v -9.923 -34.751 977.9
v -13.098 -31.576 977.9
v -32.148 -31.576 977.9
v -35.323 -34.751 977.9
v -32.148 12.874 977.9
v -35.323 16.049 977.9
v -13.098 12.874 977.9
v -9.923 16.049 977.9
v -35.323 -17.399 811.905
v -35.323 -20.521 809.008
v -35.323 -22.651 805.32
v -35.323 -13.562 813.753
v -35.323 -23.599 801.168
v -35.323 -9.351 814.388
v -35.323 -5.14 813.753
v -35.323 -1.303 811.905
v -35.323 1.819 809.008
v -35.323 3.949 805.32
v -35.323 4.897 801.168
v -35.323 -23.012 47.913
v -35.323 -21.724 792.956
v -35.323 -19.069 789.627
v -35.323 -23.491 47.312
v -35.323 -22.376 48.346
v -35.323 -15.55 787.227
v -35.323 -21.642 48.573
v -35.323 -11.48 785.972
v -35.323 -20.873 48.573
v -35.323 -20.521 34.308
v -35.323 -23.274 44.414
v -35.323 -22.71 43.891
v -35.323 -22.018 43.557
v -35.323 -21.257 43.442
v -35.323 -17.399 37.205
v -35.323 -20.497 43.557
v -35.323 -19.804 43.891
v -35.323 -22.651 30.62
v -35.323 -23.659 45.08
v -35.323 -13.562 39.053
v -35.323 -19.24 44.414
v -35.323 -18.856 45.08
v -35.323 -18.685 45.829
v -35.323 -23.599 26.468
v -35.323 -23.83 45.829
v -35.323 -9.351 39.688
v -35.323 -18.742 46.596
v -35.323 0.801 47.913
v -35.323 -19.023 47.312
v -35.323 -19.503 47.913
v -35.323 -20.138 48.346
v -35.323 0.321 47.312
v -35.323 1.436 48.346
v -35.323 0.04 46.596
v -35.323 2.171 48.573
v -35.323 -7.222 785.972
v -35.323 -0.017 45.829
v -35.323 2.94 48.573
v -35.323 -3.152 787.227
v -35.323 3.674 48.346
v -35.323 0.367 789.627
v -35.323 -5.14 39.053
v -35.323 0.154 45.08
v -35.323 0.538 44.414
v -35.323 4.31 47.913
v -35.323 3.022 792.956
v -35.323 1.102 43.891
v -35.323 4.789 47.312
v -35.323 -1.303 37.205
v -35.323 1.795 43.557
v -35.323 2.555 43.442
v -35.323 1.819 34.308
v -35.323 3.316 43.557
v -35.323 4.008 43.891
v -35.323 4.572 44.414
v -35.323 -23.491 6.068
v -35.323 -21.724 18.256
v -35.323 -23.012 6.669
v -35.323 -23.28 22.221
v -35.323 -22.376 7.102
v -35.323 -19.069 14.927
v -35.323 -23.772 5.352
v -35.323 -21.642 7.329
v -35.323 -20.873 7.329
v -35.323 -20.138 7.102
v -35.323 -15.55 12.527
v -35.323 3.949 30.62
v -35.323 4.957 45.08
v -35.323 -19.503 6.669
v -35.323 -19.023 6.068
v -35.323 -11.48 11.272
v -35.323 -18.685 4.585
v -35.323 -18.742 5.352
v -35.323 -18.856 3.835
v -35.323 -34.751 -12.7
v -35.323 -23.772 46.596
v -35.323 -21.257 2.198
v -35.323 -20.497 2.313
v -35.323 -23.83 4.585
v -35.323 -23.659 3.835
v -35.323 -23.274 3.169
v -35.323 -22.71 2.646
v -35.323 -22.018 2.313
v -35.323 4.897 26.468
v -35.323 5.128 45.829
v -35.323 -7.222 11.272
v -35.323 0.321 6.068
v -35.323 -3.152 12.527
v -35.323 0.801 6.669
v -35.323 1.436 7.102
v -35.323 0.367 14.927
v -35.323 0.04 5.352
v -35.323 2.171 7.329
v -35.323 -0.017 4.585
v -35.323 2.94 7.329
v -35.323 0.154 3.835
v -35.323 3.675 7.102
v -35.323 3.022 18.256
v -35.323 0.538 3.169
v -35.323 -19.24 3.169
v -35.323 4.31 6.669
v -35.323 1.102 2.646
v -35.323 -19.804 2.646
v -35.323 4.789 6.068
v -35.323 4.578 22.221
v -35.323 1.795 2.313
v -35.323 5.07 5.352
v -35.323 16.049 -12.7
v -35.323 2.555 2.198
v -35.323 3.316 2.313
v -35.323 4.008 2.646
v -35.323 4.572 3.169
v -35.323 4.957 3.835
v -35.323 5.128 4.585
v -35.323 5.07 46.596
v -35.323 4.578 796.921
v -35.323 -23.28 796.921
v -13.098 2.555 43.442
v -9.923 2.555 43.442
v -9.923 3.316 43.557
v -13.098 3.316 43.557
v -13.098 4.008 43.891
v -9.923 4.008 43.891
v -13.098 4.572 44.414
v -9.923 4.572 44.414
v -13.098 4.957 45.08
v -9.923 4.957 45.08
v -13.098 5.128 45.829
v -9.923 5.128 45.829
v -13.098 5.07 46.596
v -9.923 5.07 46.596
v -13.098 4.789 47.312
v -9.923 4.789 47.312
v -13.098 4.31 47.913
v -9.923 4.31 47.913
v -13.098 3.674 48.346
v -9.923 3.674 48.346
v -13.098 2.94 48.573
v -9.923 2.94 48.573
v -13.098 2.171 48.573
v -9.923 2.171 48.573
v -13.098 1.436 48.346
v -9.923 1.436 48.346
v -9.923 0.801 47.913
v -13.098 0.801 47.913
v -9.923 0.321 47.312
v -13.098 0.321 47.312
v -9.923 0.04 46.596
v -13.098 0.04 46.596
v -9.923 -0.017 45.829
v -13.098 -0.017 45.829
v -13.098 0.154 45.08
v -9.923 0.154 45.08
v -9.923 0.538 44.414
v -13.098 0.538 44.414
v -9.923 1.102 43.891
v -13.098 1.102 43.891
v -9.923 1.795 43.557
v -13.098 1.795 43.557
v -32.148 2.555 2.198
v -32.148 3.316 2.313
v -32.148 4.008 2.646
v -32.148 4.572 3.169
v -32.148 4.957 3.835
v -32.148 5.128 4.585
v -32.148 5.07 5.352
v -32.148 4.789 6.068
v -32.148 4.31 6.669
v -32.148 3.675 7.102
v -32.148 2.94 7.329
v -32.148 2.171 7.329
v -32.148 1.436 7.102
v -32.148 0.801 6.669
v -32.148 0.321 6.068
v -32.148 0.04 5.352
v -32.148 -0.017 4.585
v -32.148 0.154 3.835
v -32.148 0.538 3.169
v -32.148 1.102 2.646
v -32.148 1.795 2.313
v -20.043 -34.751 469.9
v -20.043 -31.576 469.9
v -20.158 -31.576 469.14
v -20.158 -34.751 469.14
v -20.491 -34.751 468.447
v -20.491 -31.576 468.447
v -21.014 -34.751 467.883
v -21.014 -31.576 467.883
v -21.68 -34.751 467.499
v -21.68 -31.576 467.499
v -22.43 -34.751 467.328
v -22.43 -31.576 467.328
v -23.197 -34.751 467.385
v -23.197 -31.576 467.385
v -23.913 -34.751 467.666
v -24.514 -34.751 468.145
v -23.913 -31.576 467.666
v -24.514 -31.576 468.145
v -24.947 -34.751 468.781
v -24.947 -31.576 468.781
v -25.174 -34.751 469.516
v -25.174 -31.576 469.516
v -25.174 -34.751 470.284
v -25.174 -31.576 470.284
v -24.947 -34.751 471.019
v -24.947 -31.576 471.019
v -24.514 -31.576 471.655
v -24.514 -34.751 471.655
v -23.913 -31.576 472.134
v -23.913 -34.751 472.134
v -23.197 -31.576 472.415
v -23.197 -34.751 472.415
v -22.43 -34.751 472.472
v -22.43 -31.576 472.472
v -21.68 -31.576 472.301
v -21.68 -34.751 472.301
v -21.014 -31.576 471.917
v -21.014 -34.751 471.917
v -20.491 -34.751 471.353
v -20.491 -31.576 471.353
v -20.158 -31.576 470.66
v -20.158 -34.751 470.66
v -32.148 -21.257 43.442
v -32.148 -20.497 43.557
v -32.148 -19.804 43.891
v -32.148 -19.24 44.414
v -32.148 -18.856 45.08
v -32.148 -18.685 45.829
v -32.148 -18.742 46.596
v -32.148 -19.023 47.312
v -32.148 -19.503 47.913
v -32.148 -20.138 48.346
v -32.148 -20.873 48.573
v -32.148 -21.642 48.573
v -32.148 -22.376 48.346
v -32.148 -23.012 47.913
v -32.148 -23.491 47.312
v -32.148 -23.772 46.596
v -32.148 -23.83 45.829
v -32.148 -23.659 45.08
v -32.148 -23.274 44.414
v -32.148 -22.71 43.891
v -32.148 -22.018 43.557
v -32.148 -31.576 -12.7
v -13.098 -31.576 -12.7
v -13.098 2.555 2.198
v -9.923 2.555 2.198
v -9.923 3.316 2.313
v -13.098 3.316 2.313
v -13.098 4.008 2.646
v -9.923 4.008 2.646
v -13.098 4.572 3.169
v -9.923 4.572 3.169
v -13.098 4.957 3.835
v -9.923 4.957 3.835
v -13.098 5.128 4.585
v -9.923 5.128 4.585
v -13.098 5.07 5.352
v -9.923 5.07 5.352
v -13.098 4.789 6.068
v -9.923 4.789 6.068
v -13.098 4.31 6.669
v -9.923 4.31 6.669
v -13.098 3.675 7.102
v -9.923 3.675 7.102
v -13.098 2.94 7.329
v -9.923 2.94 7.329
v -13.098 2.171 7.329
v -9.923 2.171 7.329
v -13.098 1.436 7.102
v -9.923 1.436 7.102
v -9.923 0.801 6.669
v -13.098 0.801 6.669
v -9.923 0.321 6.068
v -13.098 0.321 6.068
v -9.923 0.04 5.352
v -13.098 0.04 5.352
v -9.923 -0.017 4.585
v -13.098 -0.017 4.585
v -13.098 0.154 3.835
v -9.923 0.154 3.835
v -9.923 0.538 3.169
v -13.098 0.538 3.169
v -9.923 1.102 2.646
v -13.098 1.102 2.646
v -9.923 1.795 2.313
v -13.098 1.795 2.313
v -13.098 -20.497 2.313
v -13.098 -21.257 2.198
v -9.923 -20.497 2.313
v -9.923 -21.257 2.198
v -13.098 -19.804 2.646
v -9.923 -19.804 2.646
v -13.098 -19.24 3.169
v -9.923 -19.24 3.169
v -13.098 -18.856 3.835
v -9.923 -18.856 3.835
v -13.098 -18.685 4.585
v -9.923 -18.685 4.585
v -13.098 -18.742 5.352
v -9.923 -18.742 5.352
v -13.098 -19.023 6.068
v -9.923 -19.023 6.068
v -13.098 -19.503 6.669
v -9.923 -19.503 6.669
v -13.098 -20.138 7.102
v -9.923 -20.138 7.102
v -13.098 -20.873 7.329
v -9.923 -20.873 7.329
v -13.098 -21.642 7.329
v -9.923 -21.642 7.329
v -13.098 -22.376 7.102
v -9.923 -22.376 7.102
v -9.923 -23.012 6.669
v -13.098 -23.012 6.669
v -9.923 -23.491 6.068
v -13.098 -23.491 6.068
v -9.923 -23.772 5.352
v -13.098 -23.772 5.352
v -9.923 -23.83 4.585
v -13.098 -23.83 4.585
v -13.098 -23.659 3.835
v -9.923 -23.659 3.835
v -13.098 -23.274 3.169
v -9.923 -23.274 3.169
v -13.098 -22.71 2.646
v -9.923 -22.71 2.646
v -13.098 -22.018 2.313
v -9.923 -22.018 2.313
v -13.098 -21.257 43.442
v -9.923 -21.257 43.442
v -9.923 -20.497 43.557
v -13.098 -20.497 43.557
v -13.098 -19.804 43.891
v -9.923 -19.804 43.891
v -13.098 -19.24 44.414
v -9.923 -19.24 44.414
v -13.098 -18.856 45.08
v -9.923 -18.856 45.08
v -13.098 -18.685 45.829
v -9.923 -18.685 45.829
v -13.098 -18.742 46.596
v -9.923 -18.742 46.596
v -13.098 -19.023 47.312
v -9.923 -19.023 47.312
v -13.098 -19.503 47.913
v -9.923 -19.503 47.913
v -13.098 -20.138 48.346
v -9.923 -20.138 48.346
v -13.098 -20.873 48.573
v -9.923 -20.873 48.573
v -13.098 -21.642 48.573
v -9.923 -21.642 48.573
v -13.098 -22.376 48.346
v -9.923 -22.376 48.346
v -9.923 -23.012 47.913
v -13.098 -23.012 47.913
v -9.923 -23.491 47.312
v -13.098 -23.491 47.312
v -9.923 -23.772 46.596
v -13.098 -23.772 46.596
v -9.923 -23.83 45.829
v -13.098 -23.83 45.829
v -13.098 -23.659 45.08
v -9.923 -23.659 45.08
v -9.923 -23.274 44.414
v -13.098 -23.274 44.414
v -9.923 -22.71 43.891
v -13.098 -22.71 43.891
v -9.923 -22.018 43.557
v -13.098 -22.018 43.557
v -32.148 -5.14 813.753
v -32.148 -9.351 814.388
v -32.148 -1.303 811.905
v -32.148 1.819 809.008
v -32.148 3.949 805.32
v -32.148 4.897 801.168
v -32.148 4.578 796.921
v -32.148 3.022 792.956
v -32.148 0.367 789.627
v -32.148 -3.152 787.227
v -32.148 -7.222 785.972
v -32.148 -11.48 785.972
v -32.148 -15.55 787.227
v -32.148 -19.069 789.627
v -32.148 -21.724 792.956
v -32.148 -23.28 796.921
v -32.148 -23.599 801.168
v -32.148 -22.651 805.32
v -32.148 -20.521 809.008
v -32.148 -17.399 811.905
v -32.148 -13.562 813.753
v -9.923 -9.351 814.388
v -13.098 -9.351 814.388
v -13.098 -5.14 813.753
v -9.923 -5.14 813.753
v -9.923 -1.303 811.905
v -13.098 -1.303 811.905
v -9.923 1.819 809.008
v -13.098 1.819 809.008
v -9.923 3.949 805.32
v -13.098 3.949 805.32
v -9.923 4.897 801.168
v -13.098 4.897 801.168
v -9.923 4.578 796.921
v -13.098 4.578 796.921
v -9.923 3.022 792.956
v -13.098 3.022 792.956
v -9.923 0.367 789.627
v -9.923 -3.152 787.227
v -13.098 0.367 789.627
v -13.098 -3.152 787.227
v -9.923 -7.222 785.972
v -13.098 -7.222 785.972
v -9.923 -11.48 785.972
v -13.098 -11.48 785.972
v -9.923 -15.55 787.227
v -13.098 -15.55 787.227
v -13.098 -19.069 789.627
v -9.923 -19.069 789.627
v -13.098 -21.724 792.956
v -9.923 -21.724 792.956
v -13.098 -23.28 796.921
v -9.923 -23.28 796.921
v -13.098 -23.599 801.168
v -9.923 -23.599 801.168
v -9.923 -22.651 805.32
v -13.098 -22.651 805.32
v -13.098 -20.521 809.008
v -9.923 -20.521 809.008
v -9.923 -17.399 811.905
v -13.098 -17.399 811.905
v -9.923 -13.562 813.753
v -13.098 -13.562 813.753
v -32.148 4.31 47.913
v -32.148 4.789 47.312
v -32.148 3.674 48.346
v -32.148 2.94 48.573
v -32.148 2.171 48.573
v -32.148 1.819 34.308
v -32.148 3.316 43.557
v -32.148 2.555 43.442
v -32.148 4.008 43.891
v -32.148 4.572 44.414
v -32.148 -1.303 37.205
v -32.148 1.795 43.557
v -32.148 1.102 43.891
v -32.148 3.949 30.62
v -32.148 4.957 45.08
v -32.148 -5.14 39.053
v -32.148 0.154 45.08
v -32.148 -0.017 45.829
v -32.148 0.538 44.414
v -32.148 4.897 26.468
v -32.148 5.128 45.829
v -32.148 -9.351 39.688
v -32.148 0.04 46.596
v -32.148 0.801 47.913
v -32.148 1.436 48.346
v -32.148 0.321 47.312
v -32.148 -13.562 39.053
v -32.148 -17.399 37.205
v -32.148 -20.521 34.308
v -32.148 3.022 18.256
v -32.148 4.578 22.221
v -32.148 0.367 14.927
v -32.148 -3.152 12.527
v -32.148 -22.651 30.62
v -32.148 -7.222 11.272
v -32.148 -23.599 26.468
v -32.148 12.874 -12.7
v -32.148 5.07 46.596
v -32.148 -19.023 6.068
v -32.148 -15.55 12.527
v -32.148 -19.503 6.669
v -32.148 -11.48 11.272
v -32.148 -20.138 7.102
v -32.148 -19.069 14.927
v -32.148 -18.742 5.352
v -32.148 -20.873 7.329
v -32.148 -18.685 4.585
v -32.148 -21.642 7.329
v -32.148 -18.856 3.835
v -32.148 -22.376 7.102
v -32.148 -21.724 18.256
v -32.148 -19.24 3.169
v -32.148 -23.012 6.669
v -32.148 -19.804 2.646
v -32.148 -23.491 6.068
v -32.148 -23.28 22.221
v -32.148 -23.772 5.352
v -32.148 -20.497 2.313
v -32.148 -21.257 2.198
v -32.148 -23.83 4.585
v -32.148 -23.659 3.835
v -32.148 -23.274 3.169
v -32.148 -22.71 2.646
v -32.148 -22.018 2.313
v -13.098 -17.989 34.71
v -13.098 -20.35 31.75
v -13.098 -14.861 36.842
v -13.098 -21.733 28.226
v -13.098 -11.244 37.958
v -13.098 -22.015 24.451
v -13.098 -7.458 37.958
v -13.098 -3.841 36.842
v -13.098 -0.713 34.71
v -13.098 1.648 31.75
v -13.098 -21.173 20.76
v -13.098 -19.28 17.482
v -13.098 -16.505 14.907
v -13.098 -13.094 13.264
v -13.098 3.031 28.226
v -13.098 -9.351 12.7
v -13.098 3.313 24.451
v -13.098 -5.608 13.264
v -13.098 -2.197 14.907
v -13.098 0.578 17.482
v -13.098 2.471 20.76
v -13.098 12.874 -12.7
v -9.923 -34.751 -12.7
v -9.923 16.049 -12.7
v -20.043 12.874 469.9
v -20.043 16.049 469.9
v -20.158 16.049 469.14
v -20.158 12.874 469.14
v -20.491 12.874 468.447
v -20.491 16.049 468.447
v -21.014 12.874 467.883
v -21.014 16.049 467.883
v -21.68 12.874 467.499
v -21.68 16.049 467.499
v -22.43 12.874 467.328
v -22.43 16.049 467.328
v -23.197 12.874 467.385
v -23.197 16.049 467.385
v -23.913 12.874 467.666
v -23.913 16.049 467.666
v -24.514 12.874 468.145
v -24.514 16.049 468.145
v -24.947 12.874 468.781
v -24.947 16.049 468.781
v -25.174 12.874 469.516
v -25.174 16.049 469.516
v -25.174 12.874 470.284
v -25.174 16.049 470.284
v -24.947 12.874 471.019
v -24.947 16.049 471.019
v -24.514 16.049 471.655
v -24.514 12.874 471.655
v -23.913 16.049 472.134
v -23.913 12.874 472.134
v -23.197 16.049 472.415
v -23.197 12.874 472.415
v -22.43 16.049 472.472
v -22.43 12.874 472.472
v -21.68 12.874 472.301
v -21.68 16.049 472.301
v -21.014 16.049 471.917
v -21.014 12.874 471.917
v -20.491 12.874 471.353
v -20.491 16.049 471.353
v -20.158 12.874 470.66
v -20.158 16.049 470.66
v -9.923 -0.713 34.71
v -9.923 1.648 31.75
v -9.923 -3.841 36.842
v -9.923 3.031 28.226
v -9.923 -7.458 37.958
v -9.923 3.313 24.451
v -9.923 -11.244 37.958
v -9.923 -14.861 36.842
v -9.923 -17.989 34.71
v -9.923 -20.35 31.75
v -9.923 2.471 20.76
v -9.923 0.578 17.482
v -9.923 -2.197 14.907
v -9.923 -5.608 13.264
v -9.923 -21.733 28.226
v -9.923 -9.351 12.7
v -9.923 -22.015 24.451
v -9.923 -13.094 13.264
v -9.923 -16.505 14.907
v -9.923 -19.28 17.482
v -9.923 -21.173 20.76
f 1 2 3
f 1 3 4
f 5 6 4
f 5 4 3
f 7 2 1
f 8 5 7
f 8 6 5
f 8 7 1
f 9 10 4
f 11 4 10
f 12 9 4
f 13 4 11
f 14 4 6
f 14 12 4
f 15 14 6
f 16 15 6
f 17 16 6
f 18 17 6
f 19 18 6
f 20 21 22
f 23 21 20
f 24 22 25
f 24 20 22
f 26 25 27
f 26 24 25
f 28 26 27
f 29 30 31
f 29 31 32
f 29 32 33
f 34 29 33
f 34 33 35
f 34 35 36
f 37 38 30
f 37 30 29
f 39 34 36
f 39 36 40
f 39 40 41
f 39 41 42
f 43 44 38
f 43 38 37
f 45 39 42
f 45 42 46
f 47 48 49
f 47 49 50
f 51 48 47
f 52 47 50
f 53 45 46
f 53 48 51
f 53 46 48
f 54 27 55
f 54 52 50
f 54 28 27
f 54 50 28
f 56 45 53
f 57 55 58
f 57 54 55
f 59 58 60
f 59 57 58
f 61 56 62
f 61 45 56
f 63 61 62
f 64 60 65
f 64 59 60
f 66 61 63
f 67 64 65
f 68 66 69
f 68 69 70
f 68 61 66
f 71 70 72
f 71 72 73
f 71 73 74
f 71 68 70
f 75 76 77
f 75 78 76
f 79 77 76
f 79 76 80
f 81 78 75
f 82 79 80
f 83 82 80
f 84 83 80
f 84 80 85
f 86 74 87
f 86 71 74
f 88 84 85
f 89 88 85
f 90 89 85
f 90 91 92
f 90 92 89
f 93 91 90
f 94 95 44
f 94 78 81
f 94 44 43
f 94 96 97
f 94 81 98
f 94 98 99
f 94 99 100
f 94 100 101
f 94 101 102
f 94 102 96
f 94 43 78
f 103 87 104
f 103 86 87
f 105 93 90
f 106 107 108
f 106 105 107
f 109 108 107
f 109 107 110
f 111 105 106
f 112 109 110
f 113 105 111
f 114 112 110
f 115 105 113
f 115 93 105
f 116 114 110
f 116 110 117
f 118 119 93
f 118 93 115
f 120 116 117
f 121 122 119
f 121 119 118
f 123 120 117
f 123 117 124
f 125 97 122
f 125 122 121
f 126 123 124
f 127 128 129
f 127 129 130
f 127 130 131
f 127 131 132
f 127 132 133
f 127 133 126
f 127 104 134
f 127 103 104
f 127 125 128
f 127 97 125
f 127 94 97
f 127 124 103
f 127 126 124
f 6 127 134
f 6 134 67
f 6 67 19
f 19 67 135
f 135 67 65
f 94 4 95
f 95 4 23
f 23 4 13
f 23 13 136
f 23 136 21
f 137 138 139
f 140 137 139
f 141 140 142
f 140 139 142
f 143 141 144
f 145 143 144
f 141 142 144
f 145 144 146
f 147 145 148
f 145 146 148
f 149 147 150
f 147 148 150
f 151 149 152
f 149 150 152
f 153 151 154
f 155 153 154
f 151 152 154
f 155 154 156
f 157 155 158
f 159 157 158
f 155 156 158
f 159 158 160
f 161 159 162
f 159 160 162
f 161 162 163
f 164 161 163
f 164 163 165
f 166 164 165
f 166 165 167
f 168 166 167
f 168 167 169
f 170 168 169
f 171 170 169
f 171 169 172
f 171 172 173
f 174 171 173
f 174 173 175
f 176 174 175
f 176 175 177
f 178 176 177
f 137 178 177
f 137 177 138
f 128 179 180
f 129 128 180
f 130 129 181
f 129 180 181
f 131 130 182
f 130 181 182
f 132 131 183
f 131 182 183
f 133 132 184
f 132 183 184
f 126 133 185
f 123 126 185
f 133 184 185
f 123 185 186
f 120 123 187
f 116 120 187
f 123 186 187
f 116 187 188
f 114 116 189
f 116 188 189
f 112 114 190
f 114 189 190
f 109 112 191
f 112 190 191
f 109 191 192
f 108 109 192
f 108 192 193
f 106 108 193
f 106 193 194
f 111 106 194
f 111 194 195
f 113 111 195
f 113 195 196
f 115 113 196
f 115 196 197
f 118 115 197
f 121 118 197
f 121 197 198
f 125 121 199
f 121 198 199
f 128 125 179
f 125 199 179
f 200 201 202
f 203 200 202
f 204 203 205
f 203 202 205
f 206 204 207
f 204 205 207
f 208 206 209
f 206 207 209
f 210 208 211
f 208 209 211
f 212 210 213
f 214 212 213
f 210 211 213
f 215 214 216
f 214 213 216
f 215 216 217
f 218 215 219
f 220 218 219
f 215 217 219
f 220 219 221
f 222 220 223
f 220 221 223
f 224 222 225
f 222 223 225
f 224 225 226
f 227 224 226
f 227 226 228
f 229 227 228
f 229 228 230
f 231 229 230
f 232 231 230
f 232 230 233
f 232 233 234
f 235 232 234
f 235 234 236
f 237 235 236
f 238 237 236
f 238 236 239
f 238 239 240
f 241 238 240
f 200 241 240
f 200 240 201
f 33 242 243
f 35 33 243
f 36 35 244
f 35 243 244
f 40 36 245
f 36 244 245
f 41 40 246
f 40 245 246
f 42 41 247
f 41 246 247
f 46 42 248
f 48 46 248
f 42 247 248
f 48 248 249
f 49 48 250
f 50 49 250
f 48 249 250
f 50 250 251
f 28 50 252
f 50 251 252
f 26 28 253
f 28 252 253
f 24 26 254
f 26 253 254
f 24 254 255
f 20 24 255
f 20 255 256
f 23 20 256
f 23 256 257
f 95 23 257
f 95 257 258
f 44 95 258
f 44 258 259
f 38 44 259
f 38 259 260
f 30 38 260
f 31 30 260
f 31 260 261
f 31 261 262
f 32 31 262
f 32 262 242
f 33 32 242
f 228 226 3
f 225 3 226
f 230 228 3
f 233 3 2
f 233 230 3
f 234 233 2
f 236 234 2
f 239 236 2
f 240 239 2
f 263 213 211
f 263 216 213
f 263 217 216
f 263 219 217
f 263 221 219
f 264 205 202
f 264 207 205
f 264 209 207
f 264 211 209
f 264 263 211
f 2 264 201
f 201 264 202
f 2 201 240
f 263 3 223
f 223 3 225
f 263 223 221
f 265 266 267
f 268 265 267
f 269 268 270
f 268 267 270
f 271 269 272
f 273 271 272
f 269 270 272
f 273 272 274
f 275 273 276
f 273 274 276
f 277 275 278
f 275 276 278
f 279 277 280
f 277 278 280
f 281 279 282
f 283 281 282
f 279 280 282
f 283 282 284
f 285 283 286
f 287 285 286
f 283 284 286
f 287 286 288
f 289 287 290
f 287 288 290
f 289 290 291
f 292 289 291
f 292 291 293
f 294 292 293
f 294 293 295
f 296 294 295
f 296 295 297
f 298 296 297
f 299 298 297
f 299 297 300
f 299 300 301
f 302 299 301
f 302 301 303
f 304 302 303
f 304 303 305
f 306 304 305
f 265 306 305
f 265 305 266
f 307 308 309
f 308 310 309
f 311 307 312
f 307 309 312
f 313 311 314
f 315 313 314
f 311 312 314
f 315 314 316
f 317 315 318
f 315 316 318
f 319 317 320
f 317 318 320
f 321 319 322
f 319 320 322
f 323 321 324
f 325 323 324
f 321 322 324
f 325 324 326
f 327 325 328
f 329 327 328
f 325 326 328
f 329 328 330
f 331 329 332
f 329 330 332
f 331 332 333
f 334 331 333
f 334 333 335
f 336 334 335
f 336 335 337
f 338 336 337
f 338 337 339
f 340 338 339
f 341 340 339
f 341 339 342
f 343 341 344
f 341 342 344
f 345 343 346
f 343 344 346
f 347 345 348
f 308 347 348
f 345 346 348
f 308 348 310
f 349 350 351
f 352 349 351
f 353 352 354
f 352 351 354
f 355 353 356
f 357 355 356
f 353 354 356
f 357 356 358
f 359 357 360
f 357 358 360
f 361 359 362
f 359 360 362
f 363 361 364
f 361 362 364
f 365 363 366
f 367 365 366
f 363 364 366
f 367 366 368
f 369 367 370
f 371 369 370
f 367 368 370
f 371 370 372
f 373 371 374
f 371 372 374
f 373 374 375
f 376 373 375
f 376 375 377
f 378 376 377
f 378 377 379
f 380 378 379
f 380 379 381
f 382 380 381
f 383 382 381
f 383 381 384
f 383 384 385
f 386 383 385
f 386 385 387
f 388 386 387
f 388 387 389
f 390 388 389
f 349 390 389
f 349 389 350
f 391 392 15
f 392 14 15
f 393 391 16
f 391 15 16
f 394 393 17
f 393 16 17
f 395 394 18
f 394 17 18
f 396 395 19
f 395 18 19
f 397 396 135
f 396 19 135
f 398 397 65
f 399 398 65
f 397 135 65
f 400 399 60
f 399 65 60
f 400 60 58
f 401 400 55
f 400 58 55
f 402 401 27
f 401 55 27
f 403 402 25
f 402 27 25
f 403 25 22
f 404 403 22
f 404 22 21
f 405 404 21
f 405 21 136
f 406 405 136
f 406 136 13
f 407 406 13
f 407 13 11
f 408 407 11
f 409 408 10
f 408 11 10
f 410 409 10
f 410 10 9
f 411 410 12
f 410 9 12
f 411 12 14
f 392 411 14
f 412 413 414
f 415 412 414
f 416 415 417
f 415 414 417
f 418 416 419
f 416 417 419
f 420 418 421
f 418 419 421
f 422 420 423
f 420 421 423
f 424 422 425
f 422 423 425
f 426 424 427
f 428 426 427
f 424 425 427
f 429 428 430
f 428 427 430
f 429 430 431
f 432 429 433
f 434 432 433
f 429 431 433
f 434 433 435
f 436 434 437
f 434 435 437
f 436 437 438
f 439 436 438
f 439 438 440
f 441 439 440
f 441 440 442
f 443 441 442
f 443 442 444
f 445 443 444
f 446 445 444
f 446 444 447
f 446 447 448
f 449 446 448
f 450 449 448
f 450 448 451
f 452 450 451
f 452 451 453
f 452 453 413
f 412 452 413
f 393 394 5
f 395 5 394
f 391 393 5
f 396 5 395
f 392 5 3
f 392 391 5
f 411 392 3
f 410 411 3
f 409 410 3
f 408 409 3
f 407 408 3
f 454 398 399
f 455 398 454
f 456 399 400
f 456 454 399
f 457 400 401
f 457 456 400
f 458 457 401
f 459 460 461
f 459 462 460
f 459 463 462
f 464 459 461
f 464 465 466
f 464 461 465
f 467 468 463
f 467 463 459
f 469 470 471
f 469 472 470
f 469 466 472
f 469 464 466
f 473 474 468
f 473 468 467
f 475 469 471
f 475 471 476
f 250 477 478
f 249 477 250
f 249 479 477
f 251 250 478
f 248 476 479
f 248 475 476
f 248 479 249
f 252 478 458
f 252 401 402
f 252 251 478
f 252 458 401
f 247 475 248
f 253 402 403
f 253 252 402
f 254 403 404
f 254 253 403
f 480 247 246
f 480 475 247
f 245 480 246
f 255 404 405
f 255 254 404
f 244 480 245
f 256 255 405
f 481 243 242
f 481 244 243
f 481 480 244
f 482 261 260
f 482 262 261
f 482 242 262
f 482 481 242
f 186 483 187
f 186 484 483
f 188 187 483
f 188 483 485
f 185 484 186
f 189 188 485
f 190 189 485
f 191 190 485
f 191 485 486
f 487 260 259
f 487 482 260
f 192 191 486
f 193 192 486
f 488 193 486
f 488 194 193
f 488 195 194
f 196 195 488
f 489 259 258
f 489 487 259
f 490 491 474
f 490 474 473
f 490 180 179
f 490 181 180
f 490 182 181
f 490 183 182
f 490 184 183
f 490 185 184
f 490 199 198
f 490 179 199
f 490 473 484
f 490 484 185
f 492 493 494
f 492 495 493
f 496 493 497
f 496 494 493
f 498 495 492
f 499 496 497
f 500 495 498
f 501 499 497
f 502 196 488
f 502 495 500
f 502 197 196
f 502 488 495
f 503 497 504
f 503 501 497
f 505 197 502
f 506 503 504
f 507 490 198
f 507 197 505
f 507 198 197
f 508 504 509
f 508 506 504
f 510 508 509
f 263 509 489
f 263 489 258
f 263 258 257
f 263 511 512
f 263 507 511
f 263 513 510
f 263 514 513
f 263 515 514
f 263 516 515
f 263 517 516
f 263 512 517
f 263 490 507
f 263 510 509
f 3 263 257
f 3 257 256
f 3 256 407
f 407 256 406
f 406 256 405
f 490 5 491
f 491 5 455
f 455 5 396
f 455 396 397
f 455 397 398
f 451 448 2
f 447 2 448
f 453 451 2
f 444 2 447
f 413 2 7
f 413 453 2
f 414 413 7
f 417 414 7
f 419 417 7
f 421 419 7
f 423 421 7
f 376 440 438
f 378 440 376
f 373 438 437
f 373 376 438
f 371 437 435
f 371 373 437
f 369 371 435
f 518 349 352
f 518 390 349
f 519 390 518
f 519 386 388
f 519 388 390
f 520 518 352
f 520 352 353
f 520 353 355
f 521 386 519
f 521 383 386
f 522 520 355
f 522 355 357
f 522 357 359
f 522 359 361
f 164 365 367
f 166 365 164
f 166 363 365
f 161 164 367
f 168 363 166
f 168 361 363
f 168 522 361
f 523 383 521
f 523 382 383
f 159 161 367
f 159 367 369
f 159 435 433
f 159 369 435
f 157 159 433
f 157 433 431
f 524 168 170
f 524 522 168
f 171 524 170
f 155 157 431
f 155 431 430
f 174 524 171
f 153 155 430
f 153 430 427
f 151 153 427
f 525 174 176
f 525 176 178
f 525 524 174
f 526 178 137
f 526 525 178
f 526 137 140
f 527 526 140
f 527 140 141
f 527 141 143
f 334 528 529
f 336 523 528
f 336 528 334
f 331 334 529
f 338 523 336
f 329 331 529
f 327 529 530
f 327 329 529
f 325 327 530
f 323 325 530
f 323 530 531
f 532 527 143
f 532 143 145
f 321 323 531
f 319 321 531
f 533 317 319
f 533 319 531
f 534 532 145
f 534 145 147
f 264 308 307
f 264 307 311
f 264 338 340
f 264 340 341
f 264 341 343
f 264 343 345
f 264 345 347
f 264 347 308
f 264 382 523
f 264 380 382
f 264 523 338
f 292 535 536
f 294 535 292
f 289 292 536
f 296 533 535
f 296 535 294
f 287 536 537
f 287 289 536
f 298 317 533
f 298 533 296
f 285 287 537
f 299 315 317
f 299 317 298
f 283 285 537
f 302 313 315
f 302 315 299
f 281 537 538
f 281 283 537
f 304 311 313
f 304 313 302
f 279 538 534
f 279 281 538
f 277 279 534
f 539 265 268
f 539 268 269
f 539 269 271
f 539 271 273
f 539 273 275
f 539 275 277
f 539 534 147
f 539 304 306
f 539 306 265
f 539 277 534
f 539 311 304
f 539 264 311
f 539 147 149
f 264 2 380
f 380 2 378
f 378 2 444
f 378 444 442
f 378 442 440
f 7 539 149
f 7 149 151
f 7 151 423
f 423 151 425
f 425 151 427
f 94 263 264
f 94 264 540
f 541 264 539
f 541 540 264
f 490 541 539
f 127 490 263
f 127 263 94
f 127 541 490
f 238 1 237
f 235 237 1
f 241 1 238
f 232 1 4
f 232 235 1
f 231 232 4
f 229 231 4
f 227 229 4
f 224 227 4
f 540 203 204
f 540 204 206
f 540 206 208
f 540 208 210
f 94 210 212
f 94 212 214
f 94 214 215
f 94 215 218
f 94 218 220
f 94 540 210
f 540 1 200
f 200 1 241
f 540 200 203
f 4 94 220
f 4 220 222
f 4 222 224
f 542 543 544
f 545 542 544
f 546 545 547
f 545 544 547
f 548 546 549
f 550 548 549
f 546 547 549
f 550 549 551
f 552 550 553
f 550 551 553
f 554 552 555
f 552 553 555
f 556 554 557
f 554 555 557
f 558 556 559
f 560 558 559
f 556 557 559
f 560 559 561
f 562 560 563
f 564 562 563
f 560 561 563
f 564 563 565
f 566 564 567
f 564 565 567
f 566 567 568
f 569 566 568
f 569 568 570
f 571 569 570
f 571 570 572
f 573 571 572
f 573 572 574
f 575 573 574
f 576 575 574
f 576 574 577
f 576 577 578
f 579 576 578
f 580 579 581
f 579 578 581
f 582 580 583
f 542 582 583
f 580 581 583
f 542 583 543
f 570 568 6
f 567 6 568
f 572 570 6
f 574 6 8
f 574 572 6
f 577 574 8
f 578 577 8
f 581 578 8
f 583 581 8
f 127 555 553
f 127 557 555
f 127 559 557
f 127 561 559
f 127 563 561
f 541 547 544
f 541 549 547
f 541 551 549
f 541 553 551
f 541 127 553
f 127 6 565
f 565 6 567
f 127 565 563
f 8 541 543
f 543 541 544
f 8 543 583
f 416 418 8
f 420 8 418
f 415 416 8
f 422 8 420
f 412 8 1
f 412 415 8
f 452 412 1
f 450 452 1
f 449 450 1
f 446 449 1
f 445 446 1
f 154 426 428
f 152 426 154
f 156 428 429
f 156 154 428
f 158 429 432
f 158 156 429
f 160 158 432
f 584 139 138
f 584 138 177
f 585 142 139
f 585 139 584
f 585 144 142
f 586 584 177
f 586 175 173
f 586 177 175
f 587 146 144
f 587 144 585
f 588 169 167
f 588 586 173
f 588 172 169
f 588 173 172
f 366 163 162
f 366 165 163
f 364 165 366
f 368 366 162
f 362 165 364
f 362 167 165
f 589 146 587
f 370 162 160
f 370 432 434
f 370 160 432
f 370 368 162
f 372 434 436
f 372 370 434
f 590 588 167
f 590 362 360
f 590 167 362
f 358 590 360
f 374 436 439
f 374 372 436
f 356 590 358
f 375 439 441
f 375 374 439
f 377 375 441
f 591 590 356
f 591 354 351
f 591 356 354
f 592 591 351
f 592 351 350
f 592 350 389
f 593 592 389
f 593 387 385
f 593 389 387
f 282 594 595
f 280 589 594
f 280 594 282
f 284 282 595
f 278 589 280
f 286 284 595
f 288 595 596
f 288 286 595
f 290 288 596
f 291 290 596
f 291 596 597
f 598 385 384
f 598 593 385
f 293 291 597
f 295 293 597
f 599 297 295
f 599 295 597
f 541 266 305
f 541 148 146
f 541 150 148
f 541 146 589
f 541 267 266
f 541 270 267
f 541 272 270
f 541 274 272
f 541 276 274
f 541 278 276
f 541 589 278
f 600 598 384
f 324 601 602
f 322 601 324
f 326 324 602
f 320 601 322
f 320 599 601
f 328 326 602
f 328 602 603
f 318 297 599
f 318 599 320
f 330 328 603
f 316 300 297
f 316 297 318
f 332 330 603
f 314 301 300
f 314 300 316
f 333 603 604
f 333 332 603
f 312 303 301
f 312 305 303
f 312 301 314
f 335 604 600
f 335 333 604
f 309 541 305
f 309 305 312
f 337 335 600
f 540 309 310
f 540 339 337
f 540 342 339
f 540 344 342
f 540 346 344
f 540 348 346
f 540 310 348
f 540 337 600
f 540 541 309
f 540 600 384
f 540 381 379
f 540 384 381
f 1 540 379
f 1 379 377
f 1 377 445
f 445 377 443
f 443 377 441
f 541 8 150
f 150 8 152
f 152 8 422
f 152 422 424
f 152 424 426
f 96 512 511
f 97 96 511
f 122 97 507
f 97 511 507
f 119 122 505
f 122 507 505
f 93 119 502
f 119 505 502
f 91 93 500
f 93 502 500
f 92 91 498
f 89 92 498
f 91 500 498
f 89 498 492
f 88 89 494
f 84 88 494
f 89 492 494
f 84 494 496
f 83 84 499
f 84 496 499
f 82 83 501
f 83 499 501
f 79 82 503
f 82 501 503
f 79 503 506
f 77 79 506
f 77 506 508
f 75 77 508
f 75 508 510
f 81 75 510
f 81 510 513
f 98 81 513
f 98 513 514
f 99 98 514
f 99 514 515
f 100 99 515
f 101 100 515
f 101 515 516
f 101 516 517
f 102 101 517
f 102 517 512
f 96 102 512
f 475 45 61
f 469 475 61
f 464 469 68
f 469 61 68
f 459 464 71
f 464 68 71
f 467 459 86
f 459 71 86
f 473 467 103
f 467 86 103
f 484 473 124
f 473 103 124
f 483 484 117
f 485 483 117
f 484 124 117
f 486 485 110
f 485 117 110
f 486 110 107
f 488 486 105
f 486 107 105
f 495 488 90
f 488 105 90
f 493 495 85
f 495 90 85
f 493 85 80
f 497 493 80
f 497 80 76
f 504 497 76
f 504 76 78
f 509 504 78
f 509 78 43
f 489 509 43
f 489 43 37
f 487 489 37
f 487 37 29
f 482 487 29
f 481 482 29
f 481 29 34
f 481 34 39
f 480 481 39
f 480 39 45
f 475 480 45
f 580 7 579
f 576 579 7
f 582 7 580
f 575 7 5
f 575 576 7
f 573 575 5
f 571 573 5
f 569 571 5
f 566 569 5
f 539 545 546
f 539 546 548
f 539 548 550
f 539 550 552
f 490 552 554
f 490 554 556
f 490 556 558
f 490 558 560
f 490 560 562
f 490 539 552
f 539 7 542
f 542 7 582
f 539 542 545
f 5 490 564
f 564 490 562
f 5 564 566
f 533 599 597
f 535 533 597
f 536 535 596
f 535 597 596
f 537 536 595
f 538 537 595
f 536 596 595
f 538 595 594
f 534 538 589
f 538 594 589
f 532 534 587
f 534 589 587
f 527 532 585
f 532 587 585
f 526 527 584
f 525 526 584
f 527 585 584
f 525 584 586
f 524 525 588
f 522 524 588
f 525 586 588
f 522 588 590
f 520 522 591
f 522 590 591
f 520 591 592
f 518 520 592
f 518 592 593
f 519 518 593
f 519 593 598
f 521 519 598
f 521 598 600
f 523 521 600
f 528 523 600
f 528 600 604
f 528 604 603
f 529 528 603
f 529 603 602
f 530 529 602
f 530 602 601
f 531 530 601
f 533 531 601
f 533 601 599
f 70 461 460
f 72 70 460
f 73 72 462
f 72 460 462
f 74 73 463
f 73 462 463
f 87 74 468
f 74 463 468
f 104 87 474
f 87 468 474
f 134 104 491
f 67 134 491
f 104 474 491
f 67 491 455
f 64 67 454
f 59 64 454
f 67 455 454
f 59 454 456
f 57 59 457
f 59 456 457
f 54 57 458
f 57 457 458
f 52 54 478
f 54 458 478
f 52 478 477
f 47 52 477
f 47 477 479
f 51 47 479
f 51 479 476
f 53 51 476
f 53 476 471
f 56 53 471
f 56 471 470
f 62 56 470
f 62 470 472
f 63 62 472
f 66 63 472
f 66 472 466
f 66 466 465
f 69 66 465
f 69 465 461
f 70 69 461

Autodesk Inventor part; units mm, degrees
ref_plane "YZ Plane" through (0, 0, 0) normal (1, 0, 0) x (0, 1, 0)
ref_plane "XZ Plane" through (0, 0, 0) normal (0, 1, 0) x (-1, 0, 0)
ref_plane "XY Plane" through (0, 0, 0) normal (0, 0, 1) x (1, 0, 0)
sketch "Sketch1" plane through (0, 0, 0) normal (0, 0, 1) x (1, 0, 0)
  line L0 (-35.3228, 16.049) -> (-9.9228, 16.049)
  line L1 (-9.9228, 16.049) -> (-9.9228, -34.751)
  line L2 (-9.9228, -34.751) -> (-35.3228, -34.751)
  line L3 (-35.3228, -34.751) -> (-35.3228, 16.049)
  line L4 (-13.0978, 12.874) -> (-32.1478, 12.874)
  line L5 (-32.1478, 12.874) -> (-32.1478, -31.576)
  line L6 (-32.1478, -31.576) -> (-13.0978, -31.576)
  line L7 (-13.0978, -31.576) -> (-13.0978, 12.874)
  point P0 (0, 0)
  dimension "d0" = 25.4
  dimension "d1" = 50.8
  dimension "d2" = 3.175
extrude "Extrusion1" add sketch "Sketch1" along normal blind 977.9
sketch "Sketch2" plane through (-35.3228, -34.751, 0) normal (-1, 0, 0) x (0, 0, 1)
  line L0 (0, 0) -> (0, 50.8) construction
  line L1 (0, 25.4) -> (25.4, 25.4) construction
  circle A0 centre (25.4, 25.4) radius 14.2875
  point P0 (0, 34.751)
  dimension "d5" = 25.4
  dimension "d9" = 28.575
extrude "Extrusion2" cut sketch "Sketch2" against normal blind 12.7
sketch "Sketch3" plane through (-35.3228, -34.751, 0) normal (-1, 0, 0) x (0, 0, 1)
  line L0 (977.9, 50.8) -> (977.9, 0) construction
  line L1 (977.9, 25.4) -> (800.1, 25.4) construction
  circle A0 centre (800.1, 25.4) radius 14.2875
  point P0 (0, 34.751)
  dimension "d10" = 177.8
  dimension "d11" = 28.575
extrude "Extrusion3" cut sketch "Sketch3" against normal blind 25.4
sketch "Sketch7" plane through (-9.9228, -34.751, 0) normal (1, 0, 0) x (0, 0, -1)
  line L0 (0, 0) -> (0, 50.8) construction
  line L1 (0, 25.4) -> (-25.4, 25.4) construction
  circle A0 centre (-25.4, 25.4) radius 12.7
  point P0 (0, 34.751)
  dimension "d34" = 25.4
  dimension "d35" = 25.4
extrude "Extrusion7" cut sketch "Sketch7" against normal blind 12.7
sketch "Sketch9" plane through (-9.9228, -34.751, 0) normal (1, 0, 0) x (0, 0, -1)
  circle A0 centre (-25.4, 25.4) radius 12.7 construction
  line L0 (-25.4, 25.4) -> (-25.4, 49.2125) construction
  line L1 (-25.4, 49.2125) -> (-4.7778, 37.3063) construction
  line L2 (-4.7778, 37.3063) -> (-4.7778, 13.4938) construction
  line L3 (-4.7778, 13.4938) -> (-25.4, 1.5875) construction
  line L4 (-25.4, 1.5875) -> (-46.0222, 13.4937) construction
  line L5 (-46.0222, 13.4937) -> (-46.0222, 37.3062) construction
  line L6 (-46.0222, 37.3062) -> (-25.4, 49.2125) construction
  circle A1 centre (-4.7778, 37.3063) radius 2.5797
  circle A2 centre (-4.7778, 13.4938) radius 2.5797
  circle A3 centre (-46.0222, 13.4938) radius 2.5797
  circle A4 centre (-46.0222, 37.3062) radius 2.5797
  point P0 (0, 34.751)
  dimension "d44" = 23.8125
  dimension "d45" = 5.1594
  dimension "d46" = 5.1594
  dimension "d47" = 5.1594
  dimension "d48" = 5.1594
extrude "Extrusion9" cut sketch "Sketch9" against normal blind 25.4
sketch "Sketch10" plane through (0, 0, 0) normal (0, 0, -1) x (-1, 0, 0)
  line L0 (35.3228, 16.049) -> (9.9228, 16.049) projected
  line L1 (9.9228, 16.049) -> (13.0978, 16.049)
  line L2 (13.0978, 16.049) -> (13.0978, -34.751)
  line L3 (13.0978, -34.751) -> (9.9228, -34.751)
  line L4 (9.9228, -34.751) -> (9.9228, 16.049)
  line L5 (9.9228, -34.751) -> (35.3228, -34.751) projected
  line L6 (9.9228, -34.751) -> (35.3228, -34.751)
  line L7 (35.3228, -34.751) -> (35.3228, -31.576)
  line L8 (35.3228, -31.576) -> (9.9228, -31.576)
  line L9 (9.9228, -31.576) -> (9.9228, -34.751)
  line L10 (35.3228, -34.751) -> (32.1478, -34.751)
  line L11 (32.1478, -34.751) -> (32.1478, 16.049)
  line L12 (32.1478, 16.049) -> (35.3228, 16.049)
  line L13 (35.3228, 16.049) -> (35.3228, -34.751)
  line L14 (9.9228, 16.049) -> (35.3228, 16.049)
  line L15 (35.3228, 16.049) -> (35.3228, 12.874)
  line L16 (35.3228, 12.874) -> (9.9228, 12.874)
  line L17 (9.9228, 12.874) -> (9.9228, 16.049)
  point P0 (0, 0)
  dimension "d51" = 3.175
  dimension "d52" = 50.8
  dimension "d53" = 25.4
  dimension "d54" = 3.175
  dimension "d55" = 3.175
  dimension "d56" = 50.8
  dimension "d57" = 25.4
  dimension "d58" = 3.175
extrude "Extrusion10" add sketch "Sketch10" along normal blind 12.7 contours L13 L16 L11 L0 | L11 L16 L2 L0 | L13 L8 L11 L16 | L2 L16 L4 L0 | L7 L5 L11 L8 | L2 L8 L4 L16 | L11 L5 L2 L8 | L2 L3 L4 L8
sketch "Sketch11" plane through (-35.3228, 16.049, 977.9) normal (0, 1, 0) x (1, 0, 0)
  line L0 (0, 0) -> (25.4, 0) construction
  line L1 (12.7, 0) -> (12.7, 508) construction
  line L2 (25.4, 0) -> (25.4, 990.6) construction
  line L3 (12.7, 0) -> (520.7, 0) construction
  circle A0 centre (12.7, 508) radius 2.5797
  point P0 (35.3228, 977.9)
  dimension "d61" = 508
  dimension "d62" = 90
  dimension "d63" = 5.1594
extrude "Extrusion11" cut sketch "Sketch11" against normal blind 101.6
properties part number "41.75in Arm Beam Alternate (Left)"
